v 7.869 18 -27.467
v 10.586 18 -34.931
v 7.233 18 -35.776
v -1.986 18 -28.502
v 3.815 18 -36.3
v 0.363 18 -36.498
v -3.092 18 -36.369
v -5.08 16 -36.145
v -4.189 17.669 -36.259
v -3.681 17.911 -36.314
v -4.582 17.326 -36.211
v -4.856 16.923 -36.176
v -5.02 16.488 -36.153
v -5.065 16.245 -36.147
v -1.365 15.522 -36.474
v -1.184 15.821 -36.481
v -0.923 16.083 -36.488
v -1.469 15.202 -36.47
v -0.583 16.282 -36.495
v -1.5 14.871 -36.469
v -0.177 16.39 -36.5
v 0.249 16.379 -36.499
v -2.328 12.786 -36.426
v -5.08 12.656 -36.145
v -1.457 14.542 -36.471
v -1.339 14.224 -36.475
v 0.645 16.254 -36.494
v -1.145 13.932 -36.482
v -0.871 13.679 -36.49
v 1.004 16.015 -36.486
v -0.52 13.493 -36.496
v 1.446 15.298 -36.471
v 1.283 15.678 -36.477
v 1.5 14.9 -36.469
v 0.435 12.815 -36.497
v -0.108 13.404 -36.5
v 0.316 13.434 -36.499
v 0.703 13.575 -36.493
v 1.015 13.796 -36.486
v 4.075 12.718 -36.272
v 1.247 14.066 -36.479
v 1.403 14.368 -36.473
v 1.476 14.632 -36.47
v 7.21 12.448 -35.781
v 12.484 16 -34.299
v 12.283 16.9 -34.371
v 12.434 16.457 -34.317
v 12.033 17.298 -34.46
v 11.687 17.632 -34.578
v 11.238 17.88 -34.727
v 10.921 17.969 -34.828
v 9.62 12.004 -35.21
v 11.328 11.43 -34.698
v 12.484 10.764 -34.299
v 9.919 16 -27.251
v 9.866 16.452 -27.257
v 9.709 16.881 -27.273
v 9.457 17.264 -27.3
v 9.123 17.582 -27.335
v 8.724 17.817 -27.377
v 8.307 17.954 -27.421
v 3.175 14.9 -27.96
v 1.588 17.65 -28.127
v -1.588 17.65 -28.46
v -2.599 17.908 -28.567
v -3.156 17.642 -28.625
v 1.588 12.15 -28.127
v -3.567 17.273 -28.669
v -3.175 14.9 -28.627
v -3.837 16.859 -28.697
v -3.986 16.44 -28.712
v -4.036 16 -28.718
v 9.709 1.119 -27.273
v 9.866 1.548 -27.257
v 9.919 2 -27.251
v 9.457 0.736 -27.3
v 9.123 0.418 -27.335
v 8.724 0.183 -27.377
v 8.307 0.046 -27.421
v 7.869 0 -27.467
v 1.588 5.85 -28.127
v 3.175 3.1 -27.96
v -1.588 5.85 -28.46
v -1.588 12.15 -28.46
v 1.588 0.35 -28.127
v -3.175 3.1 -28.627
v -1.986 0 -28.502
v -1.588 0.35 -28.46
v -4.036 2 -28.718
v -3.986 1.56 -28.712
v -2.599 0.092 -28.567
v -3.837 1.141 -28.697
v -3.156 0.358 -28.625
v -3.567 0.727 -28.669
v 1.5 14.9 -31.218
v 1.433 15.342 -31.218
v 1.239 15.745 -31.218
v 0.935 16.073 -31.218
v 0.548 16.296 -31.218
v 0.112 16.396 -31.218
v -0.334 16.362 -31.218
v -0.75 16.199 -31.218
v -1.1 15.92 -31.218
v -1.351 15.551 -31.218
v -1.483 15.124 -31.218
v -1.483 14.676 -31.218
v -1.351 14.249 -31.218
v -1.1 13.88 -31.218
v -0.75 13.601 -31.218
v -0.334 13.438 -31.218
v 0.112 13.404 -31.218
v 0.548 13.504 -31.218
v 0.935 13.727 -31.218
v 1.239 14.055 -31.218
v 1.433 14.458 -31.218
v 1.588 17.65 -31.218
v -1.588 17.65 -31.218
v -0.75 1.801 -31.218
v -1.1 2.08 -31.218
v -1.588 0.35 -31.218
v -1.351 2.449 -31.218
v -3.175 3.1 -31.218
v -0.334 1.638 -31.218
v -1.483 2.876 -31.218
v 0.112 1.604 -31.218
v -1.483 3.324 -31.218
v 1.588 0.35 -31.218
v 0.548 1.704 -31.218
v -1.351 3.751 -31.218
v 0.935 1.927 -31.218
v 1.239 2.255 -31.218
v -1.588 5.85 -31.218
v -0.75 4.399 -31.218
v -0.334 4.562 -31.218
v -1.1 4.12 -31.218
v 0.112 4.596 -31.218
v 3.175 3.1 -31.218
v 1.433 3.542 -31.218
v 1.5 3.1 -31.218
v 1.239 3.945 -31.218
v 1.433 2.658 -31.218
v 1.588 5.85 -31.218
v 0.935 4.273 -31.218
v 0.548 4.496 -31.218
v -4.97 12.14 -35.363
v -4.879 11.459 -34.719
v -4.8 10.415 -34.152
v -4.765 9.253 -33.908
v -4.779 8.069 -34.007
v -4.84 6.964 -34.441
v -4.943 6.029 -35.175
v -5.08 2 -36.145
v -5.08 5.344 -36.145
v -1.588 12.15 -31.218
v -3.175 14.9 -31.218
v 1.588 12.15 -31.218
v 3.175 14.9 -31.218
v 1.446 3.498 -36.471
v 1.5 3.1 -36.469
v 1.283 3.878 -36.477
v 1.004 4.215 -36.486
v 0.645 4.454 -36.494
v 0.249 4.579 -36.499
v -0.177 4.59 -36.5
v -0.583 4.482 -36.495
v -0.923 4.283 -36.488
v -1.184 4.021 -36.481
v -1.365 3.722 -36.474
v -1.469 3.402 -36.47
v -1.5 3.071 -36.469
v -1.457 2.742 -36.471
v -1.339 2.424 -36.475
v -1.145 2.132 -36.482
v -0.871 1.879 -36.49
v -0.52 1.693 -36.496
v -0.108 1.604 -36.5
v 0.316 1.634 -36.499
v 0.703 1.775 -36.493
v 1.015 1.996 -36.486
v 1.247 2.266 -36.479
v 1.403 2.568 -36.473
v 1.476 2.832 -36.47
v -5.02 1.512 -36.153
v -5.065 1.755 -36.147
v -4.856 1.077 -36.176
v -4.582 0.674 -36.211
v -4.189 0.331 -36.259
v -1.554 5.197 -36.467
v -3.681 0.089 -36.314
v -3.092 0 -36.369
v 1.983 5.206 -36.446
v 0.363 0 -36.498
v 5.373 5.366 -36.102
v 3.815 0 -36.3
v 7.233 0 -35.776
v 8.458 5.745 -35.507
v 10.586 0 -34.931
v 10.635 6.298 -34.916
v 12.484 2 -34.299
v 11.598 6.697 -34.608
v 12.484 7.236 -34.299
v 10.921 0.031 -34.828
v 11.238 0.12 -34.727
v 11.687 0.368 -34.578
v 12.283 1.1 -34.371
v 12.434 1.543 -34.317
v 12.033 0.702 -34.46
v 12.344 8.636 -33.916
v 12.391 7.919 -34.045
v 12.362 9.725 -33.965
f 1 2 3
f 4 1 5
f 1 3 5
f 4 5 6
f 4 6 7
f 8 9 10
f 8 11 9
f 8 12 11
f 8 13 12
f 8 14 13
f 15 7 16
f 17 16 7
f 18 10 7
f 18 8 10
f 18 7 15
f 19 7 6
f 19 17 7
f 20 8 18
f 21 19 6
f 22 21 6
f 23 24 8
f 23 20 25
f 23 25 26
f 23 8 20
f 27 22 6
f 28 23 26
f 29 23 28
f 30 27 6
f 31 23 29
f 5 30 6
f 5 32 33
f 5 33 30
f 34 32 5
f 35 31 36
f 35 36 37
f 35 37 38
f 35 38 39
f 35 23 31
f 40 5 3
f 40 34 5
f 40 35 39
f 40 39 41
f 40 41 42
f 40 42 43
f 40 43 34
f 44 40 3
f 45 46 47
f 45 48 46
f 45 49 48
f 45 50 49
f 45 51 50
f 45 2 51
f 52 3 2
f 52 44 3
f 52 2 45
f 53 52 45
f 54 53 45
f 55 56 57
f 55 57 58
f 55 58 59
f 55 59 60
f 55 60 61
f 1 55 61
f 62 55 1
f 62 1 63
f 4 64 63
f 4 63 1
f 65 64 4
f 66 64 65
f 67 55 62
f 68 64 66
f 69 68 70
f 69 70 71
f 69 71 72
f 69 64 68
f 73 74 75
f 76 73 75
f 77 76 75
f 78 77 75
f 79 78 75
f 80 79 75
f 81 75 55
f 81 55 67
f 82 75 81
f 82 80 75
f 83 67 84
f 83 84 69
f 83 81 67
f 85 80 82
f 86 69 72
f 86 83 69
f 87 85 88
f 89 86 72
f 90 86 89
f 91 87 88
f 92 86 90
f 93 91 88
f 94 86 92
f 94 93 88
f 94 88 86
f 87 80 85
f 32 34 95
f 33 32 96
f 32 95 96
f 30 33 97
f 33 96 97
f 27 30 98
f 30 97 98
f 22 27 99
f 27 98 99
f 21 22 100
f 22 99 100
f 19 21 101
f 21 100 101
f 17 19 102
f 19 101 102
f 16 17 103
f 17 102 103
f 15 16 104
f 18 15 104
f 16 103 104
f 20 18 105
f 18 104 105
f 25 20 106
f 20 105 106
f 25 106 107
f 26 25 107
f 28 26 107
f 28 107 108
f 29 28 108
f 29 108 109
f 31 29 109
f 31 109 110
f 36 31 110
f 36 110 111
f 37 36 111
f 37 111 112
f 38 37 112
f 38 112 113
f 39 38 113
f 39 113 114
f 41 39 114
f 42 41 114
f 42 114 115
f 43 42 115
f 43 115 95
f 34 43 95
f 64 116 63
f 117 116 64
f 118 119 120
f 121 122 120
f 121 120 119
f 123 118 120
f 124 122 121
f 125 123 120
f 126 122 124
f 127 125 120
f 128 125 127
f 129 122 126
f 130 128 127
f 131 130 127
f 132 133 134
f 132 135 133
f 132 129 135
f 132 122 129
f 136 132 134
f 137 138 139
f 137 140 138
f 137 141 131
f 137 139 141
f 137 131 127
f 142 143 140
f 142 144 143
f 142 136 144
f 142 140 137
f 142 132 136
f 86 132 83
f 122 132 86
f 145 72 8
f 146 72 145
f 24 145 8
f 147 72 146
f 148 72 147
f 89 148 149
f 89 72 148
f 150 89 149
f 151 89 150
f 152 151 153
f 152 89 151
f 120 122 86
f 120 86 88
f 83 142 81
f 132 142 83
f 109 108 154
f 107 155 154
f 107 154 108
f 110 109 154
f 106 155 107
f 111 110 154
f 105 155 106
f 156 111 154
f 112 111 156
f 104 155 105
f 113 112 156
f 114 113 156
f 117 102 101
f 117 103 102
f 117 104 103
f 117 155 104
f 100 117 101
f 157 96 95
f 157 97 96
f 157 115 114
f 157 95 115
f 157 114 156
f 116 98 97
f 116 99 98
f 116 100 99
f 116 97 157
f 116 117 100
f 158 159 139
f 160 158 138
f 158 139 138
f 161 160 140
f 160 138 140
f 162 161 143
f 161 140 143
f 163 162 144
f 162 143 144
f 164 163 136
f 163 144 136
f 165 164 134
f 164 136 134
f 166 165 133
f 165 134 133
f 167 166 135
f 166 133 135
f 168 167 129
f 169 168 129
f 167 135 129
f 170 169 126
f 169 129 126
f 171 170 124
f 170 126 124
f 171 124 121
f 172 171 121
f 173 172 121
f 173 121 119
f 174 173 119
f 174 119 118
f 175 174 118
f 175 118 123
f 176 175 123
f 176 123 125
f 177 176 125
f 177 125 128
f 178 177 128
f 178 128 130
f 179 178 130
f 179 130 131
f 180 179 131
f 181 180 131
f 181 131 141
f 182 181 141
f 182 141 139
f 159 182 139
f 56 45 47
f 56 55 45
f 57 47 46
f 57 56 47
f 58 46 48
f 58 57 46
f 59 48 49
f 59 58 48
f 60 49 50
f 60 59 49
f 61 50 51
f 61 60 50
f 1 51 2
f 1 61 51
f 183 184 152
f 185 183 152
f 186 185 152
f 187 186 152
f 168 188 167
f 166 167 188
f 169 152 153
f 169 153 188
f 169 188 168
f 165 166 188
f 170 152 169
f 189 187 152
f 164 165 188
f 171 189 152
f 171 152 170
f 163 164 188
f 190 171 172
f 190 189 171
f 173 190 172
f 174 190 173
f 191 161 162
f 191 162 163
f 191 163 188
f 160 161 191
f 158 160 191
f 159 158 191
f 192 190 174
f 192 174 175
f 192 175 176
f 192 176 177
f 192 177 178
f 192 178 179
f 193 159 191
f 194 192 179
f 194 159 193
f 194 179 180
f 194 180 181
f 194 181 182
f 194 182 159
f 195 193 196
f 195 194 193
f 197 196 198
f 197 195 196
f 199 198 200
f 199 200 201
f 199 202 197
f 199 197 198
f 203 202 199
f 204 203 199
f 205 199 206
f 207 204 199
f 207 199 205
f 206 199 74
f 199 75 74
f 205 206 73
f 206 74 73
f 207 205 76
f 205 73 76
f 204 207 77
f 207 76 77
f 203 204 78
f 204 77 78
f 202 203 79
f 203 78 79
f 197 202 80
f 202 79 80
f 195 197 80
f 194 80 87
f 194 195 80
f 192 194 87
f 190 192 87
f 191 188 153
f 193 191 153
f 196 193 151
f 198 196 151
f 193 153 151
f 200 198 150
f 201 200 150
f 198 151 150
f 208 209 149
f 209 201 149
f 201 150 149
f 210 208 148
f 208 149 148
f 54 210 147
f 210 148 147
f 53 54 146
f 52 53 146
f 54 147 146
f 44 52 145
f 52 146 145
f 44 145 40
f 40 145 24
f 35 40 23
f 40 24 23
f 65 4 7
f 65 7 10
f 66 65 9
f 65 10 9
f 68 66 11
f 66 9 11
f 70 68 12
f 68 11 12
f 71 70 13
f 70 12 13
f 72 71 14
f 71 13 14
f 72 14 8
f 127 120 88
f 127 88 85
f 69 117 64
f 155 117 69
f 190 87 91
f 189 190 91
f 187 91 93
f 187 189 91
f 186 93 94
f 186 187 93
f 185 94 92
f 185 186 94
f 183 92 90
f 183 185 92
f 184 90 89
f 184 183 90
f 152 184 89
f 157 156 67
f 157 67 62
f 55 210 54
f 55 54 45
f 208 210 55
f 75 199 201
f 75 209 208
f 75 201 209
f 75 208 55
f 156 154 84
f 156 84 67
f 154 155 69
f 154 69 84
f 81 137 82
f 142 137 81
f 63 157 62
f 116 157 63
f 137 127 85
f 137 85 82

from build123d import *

# Parameters (mm, degrees)
BOSS_EXTRUDE1_DEPTH     = 18
CUT_EXTRUDE1_DEPTH      = 44.04814257
CUT_EXTRUDE1_DEPTH_BACK = 44.04814257
SKETCH5_R               = 1.5
CUT_EXTRUDE2_DEPTH      = 44.048142727
CUT_EXTRUDE3_START      = -18
CUT_EXTRUDE3_DEPTH      = 18
FILLET1_R               = 2
CUT_EXTRUDE4_DEPTH      = 24.246649109
CUT_EXTRUDE4_DEPTH_BACK = 2.5


# Read off the part's stored shape, not the designer's step: Cut-Extrude3
with BuildPart() as part:
    # Sketch2 → Boss-Extrude1 (new body)
    with BuildSketch(Plane(origin=(0, 0, 0), x_dir=(1, 0, 0), z_dir=(0, 1, 0))):
        with BuildLine():
            Line((12.654745303, 34.768626969), (9.918584156, 27.251086003))
            Line((9.918584156, 27.251086003), (-4.036019928, 28.717773994))
            Line((-4.036019928, 28.717773994), (-5.149404736, 36.639918543))
            ThreePointArc((-5.149404736, 36.639918543), (3.867553141, 36.797310129), (12.654745303, 34.768626969))
        make_face()
    extrude(amount=BOSS_EXTRUDE1_DEPTH)

    # Sketch3 → Cut-Extrude1 (cut, two sides: drawn at the far end of the back side and taken through both)
    with BuildSketch(Plane(origin=(0, 0, 0), x_dir=(0, 0, -1), z_dir=(1, 0, 0)).offset(-CUT_EXTRUDE1_DEPTH_BACK)):
        with BuildLine():
            Line((38, 13.1), (39.768626969, 13.1))
            Line((39.768626969, 13.1), (39.768626969, 4.9))
            Line((39.768626969, 4.9), (38, 4.9))
            ThreePointArc((38, 4.9), (33.9, 9), (38, 13.1))
        make_face()
    extrude(amount=CUT_EXTRUDE1_DEPTH + CUT_EXTRUDE1_DEPTH_BACK, mode=Mode.SUBTRACT)

    # Sketch5 → Cut-Extrude2 (cut, through all)
    with BuildSketch(Plane.XY):
        with Locations((0, 3.1)):
            Circle(SKETCH5_R)
        with Locations((0, 14.9)):
            Circle(SKETCH5_R)
    extrude(amount=-CUT_EXTRUDE2_DEPTH, mode=Mode.SUBTRACT)

    # Cut-Extrude3 outline → Cut-Extrude3 (cut)
    with BuildSketch(Plane(origin=(0, 18, 0), x_dir=(1, 0, 0), z_dir=(0, 1, 0)).offset(CUT_EXTRUDE3_START)):
        with BuildLine():
            ThreePointArc((-5.079818185, 36.144784509), (3.815289276, 36.300049142), (12.483735924, 34.298780407))
            Line((12.483735924, 34.298780407), (12.654745303, 34.768626969))
            ThreePointArc((12.654745303, 34.768626969), (3.867553141, 36.797310129), (-5.149404736, 36.639918543))
            Line((-5.149404736, 36.639918543), (-5.079818185, 36.144784509))
        make_face()
    extrude(amount=CUT_EXTRUDE3_DEPTH, mode=Mode.SUBTRACT)

    # Fillet1
    fillet1_edges = [part.edges().sort_by_distance(p)[0] for p in [
        (11.201159694, 18, -30.774933331),
        (11.201159694, 0, -30.774933331),
        (-4.557919056, 0, -32.431279251),
        (-4.557919056, 18, -32.431279251),
    ]]
    fillet(fillet1_edges, radius=FILLET1_R)

    # Sketch7 → Cut-Extrude4 (cut, two sides: drawn at the far end of the back side and taken through both)
    with BuildSketch(Plane.XY.offset(-28.717773994).offset(-CUT_EXTRUDE4_DEPTH_BACK)):
        Polygon((3.175426481, 14.9), (1.58771324, 17.65), (-1.58771324, 17.65), (-3.175426481, 14.9), (-1.58771324, 12.15), (1.58771324, 12.15), align=None)
        Polygon((3.175426481, 3.1), (1.58771324, 5.85), (-1.58771324, 5.85), (-3.175426481, 3.1), (-1.58771324, 0.35), (1.58771324, 0.35), align=None)
    extrude(amount=CUT_EXTRUDE4_DEPTH + CUT_EXTRUDE4_DEPTH_BACK, mode=Mode.SUBTRACT)


solid = part.part
